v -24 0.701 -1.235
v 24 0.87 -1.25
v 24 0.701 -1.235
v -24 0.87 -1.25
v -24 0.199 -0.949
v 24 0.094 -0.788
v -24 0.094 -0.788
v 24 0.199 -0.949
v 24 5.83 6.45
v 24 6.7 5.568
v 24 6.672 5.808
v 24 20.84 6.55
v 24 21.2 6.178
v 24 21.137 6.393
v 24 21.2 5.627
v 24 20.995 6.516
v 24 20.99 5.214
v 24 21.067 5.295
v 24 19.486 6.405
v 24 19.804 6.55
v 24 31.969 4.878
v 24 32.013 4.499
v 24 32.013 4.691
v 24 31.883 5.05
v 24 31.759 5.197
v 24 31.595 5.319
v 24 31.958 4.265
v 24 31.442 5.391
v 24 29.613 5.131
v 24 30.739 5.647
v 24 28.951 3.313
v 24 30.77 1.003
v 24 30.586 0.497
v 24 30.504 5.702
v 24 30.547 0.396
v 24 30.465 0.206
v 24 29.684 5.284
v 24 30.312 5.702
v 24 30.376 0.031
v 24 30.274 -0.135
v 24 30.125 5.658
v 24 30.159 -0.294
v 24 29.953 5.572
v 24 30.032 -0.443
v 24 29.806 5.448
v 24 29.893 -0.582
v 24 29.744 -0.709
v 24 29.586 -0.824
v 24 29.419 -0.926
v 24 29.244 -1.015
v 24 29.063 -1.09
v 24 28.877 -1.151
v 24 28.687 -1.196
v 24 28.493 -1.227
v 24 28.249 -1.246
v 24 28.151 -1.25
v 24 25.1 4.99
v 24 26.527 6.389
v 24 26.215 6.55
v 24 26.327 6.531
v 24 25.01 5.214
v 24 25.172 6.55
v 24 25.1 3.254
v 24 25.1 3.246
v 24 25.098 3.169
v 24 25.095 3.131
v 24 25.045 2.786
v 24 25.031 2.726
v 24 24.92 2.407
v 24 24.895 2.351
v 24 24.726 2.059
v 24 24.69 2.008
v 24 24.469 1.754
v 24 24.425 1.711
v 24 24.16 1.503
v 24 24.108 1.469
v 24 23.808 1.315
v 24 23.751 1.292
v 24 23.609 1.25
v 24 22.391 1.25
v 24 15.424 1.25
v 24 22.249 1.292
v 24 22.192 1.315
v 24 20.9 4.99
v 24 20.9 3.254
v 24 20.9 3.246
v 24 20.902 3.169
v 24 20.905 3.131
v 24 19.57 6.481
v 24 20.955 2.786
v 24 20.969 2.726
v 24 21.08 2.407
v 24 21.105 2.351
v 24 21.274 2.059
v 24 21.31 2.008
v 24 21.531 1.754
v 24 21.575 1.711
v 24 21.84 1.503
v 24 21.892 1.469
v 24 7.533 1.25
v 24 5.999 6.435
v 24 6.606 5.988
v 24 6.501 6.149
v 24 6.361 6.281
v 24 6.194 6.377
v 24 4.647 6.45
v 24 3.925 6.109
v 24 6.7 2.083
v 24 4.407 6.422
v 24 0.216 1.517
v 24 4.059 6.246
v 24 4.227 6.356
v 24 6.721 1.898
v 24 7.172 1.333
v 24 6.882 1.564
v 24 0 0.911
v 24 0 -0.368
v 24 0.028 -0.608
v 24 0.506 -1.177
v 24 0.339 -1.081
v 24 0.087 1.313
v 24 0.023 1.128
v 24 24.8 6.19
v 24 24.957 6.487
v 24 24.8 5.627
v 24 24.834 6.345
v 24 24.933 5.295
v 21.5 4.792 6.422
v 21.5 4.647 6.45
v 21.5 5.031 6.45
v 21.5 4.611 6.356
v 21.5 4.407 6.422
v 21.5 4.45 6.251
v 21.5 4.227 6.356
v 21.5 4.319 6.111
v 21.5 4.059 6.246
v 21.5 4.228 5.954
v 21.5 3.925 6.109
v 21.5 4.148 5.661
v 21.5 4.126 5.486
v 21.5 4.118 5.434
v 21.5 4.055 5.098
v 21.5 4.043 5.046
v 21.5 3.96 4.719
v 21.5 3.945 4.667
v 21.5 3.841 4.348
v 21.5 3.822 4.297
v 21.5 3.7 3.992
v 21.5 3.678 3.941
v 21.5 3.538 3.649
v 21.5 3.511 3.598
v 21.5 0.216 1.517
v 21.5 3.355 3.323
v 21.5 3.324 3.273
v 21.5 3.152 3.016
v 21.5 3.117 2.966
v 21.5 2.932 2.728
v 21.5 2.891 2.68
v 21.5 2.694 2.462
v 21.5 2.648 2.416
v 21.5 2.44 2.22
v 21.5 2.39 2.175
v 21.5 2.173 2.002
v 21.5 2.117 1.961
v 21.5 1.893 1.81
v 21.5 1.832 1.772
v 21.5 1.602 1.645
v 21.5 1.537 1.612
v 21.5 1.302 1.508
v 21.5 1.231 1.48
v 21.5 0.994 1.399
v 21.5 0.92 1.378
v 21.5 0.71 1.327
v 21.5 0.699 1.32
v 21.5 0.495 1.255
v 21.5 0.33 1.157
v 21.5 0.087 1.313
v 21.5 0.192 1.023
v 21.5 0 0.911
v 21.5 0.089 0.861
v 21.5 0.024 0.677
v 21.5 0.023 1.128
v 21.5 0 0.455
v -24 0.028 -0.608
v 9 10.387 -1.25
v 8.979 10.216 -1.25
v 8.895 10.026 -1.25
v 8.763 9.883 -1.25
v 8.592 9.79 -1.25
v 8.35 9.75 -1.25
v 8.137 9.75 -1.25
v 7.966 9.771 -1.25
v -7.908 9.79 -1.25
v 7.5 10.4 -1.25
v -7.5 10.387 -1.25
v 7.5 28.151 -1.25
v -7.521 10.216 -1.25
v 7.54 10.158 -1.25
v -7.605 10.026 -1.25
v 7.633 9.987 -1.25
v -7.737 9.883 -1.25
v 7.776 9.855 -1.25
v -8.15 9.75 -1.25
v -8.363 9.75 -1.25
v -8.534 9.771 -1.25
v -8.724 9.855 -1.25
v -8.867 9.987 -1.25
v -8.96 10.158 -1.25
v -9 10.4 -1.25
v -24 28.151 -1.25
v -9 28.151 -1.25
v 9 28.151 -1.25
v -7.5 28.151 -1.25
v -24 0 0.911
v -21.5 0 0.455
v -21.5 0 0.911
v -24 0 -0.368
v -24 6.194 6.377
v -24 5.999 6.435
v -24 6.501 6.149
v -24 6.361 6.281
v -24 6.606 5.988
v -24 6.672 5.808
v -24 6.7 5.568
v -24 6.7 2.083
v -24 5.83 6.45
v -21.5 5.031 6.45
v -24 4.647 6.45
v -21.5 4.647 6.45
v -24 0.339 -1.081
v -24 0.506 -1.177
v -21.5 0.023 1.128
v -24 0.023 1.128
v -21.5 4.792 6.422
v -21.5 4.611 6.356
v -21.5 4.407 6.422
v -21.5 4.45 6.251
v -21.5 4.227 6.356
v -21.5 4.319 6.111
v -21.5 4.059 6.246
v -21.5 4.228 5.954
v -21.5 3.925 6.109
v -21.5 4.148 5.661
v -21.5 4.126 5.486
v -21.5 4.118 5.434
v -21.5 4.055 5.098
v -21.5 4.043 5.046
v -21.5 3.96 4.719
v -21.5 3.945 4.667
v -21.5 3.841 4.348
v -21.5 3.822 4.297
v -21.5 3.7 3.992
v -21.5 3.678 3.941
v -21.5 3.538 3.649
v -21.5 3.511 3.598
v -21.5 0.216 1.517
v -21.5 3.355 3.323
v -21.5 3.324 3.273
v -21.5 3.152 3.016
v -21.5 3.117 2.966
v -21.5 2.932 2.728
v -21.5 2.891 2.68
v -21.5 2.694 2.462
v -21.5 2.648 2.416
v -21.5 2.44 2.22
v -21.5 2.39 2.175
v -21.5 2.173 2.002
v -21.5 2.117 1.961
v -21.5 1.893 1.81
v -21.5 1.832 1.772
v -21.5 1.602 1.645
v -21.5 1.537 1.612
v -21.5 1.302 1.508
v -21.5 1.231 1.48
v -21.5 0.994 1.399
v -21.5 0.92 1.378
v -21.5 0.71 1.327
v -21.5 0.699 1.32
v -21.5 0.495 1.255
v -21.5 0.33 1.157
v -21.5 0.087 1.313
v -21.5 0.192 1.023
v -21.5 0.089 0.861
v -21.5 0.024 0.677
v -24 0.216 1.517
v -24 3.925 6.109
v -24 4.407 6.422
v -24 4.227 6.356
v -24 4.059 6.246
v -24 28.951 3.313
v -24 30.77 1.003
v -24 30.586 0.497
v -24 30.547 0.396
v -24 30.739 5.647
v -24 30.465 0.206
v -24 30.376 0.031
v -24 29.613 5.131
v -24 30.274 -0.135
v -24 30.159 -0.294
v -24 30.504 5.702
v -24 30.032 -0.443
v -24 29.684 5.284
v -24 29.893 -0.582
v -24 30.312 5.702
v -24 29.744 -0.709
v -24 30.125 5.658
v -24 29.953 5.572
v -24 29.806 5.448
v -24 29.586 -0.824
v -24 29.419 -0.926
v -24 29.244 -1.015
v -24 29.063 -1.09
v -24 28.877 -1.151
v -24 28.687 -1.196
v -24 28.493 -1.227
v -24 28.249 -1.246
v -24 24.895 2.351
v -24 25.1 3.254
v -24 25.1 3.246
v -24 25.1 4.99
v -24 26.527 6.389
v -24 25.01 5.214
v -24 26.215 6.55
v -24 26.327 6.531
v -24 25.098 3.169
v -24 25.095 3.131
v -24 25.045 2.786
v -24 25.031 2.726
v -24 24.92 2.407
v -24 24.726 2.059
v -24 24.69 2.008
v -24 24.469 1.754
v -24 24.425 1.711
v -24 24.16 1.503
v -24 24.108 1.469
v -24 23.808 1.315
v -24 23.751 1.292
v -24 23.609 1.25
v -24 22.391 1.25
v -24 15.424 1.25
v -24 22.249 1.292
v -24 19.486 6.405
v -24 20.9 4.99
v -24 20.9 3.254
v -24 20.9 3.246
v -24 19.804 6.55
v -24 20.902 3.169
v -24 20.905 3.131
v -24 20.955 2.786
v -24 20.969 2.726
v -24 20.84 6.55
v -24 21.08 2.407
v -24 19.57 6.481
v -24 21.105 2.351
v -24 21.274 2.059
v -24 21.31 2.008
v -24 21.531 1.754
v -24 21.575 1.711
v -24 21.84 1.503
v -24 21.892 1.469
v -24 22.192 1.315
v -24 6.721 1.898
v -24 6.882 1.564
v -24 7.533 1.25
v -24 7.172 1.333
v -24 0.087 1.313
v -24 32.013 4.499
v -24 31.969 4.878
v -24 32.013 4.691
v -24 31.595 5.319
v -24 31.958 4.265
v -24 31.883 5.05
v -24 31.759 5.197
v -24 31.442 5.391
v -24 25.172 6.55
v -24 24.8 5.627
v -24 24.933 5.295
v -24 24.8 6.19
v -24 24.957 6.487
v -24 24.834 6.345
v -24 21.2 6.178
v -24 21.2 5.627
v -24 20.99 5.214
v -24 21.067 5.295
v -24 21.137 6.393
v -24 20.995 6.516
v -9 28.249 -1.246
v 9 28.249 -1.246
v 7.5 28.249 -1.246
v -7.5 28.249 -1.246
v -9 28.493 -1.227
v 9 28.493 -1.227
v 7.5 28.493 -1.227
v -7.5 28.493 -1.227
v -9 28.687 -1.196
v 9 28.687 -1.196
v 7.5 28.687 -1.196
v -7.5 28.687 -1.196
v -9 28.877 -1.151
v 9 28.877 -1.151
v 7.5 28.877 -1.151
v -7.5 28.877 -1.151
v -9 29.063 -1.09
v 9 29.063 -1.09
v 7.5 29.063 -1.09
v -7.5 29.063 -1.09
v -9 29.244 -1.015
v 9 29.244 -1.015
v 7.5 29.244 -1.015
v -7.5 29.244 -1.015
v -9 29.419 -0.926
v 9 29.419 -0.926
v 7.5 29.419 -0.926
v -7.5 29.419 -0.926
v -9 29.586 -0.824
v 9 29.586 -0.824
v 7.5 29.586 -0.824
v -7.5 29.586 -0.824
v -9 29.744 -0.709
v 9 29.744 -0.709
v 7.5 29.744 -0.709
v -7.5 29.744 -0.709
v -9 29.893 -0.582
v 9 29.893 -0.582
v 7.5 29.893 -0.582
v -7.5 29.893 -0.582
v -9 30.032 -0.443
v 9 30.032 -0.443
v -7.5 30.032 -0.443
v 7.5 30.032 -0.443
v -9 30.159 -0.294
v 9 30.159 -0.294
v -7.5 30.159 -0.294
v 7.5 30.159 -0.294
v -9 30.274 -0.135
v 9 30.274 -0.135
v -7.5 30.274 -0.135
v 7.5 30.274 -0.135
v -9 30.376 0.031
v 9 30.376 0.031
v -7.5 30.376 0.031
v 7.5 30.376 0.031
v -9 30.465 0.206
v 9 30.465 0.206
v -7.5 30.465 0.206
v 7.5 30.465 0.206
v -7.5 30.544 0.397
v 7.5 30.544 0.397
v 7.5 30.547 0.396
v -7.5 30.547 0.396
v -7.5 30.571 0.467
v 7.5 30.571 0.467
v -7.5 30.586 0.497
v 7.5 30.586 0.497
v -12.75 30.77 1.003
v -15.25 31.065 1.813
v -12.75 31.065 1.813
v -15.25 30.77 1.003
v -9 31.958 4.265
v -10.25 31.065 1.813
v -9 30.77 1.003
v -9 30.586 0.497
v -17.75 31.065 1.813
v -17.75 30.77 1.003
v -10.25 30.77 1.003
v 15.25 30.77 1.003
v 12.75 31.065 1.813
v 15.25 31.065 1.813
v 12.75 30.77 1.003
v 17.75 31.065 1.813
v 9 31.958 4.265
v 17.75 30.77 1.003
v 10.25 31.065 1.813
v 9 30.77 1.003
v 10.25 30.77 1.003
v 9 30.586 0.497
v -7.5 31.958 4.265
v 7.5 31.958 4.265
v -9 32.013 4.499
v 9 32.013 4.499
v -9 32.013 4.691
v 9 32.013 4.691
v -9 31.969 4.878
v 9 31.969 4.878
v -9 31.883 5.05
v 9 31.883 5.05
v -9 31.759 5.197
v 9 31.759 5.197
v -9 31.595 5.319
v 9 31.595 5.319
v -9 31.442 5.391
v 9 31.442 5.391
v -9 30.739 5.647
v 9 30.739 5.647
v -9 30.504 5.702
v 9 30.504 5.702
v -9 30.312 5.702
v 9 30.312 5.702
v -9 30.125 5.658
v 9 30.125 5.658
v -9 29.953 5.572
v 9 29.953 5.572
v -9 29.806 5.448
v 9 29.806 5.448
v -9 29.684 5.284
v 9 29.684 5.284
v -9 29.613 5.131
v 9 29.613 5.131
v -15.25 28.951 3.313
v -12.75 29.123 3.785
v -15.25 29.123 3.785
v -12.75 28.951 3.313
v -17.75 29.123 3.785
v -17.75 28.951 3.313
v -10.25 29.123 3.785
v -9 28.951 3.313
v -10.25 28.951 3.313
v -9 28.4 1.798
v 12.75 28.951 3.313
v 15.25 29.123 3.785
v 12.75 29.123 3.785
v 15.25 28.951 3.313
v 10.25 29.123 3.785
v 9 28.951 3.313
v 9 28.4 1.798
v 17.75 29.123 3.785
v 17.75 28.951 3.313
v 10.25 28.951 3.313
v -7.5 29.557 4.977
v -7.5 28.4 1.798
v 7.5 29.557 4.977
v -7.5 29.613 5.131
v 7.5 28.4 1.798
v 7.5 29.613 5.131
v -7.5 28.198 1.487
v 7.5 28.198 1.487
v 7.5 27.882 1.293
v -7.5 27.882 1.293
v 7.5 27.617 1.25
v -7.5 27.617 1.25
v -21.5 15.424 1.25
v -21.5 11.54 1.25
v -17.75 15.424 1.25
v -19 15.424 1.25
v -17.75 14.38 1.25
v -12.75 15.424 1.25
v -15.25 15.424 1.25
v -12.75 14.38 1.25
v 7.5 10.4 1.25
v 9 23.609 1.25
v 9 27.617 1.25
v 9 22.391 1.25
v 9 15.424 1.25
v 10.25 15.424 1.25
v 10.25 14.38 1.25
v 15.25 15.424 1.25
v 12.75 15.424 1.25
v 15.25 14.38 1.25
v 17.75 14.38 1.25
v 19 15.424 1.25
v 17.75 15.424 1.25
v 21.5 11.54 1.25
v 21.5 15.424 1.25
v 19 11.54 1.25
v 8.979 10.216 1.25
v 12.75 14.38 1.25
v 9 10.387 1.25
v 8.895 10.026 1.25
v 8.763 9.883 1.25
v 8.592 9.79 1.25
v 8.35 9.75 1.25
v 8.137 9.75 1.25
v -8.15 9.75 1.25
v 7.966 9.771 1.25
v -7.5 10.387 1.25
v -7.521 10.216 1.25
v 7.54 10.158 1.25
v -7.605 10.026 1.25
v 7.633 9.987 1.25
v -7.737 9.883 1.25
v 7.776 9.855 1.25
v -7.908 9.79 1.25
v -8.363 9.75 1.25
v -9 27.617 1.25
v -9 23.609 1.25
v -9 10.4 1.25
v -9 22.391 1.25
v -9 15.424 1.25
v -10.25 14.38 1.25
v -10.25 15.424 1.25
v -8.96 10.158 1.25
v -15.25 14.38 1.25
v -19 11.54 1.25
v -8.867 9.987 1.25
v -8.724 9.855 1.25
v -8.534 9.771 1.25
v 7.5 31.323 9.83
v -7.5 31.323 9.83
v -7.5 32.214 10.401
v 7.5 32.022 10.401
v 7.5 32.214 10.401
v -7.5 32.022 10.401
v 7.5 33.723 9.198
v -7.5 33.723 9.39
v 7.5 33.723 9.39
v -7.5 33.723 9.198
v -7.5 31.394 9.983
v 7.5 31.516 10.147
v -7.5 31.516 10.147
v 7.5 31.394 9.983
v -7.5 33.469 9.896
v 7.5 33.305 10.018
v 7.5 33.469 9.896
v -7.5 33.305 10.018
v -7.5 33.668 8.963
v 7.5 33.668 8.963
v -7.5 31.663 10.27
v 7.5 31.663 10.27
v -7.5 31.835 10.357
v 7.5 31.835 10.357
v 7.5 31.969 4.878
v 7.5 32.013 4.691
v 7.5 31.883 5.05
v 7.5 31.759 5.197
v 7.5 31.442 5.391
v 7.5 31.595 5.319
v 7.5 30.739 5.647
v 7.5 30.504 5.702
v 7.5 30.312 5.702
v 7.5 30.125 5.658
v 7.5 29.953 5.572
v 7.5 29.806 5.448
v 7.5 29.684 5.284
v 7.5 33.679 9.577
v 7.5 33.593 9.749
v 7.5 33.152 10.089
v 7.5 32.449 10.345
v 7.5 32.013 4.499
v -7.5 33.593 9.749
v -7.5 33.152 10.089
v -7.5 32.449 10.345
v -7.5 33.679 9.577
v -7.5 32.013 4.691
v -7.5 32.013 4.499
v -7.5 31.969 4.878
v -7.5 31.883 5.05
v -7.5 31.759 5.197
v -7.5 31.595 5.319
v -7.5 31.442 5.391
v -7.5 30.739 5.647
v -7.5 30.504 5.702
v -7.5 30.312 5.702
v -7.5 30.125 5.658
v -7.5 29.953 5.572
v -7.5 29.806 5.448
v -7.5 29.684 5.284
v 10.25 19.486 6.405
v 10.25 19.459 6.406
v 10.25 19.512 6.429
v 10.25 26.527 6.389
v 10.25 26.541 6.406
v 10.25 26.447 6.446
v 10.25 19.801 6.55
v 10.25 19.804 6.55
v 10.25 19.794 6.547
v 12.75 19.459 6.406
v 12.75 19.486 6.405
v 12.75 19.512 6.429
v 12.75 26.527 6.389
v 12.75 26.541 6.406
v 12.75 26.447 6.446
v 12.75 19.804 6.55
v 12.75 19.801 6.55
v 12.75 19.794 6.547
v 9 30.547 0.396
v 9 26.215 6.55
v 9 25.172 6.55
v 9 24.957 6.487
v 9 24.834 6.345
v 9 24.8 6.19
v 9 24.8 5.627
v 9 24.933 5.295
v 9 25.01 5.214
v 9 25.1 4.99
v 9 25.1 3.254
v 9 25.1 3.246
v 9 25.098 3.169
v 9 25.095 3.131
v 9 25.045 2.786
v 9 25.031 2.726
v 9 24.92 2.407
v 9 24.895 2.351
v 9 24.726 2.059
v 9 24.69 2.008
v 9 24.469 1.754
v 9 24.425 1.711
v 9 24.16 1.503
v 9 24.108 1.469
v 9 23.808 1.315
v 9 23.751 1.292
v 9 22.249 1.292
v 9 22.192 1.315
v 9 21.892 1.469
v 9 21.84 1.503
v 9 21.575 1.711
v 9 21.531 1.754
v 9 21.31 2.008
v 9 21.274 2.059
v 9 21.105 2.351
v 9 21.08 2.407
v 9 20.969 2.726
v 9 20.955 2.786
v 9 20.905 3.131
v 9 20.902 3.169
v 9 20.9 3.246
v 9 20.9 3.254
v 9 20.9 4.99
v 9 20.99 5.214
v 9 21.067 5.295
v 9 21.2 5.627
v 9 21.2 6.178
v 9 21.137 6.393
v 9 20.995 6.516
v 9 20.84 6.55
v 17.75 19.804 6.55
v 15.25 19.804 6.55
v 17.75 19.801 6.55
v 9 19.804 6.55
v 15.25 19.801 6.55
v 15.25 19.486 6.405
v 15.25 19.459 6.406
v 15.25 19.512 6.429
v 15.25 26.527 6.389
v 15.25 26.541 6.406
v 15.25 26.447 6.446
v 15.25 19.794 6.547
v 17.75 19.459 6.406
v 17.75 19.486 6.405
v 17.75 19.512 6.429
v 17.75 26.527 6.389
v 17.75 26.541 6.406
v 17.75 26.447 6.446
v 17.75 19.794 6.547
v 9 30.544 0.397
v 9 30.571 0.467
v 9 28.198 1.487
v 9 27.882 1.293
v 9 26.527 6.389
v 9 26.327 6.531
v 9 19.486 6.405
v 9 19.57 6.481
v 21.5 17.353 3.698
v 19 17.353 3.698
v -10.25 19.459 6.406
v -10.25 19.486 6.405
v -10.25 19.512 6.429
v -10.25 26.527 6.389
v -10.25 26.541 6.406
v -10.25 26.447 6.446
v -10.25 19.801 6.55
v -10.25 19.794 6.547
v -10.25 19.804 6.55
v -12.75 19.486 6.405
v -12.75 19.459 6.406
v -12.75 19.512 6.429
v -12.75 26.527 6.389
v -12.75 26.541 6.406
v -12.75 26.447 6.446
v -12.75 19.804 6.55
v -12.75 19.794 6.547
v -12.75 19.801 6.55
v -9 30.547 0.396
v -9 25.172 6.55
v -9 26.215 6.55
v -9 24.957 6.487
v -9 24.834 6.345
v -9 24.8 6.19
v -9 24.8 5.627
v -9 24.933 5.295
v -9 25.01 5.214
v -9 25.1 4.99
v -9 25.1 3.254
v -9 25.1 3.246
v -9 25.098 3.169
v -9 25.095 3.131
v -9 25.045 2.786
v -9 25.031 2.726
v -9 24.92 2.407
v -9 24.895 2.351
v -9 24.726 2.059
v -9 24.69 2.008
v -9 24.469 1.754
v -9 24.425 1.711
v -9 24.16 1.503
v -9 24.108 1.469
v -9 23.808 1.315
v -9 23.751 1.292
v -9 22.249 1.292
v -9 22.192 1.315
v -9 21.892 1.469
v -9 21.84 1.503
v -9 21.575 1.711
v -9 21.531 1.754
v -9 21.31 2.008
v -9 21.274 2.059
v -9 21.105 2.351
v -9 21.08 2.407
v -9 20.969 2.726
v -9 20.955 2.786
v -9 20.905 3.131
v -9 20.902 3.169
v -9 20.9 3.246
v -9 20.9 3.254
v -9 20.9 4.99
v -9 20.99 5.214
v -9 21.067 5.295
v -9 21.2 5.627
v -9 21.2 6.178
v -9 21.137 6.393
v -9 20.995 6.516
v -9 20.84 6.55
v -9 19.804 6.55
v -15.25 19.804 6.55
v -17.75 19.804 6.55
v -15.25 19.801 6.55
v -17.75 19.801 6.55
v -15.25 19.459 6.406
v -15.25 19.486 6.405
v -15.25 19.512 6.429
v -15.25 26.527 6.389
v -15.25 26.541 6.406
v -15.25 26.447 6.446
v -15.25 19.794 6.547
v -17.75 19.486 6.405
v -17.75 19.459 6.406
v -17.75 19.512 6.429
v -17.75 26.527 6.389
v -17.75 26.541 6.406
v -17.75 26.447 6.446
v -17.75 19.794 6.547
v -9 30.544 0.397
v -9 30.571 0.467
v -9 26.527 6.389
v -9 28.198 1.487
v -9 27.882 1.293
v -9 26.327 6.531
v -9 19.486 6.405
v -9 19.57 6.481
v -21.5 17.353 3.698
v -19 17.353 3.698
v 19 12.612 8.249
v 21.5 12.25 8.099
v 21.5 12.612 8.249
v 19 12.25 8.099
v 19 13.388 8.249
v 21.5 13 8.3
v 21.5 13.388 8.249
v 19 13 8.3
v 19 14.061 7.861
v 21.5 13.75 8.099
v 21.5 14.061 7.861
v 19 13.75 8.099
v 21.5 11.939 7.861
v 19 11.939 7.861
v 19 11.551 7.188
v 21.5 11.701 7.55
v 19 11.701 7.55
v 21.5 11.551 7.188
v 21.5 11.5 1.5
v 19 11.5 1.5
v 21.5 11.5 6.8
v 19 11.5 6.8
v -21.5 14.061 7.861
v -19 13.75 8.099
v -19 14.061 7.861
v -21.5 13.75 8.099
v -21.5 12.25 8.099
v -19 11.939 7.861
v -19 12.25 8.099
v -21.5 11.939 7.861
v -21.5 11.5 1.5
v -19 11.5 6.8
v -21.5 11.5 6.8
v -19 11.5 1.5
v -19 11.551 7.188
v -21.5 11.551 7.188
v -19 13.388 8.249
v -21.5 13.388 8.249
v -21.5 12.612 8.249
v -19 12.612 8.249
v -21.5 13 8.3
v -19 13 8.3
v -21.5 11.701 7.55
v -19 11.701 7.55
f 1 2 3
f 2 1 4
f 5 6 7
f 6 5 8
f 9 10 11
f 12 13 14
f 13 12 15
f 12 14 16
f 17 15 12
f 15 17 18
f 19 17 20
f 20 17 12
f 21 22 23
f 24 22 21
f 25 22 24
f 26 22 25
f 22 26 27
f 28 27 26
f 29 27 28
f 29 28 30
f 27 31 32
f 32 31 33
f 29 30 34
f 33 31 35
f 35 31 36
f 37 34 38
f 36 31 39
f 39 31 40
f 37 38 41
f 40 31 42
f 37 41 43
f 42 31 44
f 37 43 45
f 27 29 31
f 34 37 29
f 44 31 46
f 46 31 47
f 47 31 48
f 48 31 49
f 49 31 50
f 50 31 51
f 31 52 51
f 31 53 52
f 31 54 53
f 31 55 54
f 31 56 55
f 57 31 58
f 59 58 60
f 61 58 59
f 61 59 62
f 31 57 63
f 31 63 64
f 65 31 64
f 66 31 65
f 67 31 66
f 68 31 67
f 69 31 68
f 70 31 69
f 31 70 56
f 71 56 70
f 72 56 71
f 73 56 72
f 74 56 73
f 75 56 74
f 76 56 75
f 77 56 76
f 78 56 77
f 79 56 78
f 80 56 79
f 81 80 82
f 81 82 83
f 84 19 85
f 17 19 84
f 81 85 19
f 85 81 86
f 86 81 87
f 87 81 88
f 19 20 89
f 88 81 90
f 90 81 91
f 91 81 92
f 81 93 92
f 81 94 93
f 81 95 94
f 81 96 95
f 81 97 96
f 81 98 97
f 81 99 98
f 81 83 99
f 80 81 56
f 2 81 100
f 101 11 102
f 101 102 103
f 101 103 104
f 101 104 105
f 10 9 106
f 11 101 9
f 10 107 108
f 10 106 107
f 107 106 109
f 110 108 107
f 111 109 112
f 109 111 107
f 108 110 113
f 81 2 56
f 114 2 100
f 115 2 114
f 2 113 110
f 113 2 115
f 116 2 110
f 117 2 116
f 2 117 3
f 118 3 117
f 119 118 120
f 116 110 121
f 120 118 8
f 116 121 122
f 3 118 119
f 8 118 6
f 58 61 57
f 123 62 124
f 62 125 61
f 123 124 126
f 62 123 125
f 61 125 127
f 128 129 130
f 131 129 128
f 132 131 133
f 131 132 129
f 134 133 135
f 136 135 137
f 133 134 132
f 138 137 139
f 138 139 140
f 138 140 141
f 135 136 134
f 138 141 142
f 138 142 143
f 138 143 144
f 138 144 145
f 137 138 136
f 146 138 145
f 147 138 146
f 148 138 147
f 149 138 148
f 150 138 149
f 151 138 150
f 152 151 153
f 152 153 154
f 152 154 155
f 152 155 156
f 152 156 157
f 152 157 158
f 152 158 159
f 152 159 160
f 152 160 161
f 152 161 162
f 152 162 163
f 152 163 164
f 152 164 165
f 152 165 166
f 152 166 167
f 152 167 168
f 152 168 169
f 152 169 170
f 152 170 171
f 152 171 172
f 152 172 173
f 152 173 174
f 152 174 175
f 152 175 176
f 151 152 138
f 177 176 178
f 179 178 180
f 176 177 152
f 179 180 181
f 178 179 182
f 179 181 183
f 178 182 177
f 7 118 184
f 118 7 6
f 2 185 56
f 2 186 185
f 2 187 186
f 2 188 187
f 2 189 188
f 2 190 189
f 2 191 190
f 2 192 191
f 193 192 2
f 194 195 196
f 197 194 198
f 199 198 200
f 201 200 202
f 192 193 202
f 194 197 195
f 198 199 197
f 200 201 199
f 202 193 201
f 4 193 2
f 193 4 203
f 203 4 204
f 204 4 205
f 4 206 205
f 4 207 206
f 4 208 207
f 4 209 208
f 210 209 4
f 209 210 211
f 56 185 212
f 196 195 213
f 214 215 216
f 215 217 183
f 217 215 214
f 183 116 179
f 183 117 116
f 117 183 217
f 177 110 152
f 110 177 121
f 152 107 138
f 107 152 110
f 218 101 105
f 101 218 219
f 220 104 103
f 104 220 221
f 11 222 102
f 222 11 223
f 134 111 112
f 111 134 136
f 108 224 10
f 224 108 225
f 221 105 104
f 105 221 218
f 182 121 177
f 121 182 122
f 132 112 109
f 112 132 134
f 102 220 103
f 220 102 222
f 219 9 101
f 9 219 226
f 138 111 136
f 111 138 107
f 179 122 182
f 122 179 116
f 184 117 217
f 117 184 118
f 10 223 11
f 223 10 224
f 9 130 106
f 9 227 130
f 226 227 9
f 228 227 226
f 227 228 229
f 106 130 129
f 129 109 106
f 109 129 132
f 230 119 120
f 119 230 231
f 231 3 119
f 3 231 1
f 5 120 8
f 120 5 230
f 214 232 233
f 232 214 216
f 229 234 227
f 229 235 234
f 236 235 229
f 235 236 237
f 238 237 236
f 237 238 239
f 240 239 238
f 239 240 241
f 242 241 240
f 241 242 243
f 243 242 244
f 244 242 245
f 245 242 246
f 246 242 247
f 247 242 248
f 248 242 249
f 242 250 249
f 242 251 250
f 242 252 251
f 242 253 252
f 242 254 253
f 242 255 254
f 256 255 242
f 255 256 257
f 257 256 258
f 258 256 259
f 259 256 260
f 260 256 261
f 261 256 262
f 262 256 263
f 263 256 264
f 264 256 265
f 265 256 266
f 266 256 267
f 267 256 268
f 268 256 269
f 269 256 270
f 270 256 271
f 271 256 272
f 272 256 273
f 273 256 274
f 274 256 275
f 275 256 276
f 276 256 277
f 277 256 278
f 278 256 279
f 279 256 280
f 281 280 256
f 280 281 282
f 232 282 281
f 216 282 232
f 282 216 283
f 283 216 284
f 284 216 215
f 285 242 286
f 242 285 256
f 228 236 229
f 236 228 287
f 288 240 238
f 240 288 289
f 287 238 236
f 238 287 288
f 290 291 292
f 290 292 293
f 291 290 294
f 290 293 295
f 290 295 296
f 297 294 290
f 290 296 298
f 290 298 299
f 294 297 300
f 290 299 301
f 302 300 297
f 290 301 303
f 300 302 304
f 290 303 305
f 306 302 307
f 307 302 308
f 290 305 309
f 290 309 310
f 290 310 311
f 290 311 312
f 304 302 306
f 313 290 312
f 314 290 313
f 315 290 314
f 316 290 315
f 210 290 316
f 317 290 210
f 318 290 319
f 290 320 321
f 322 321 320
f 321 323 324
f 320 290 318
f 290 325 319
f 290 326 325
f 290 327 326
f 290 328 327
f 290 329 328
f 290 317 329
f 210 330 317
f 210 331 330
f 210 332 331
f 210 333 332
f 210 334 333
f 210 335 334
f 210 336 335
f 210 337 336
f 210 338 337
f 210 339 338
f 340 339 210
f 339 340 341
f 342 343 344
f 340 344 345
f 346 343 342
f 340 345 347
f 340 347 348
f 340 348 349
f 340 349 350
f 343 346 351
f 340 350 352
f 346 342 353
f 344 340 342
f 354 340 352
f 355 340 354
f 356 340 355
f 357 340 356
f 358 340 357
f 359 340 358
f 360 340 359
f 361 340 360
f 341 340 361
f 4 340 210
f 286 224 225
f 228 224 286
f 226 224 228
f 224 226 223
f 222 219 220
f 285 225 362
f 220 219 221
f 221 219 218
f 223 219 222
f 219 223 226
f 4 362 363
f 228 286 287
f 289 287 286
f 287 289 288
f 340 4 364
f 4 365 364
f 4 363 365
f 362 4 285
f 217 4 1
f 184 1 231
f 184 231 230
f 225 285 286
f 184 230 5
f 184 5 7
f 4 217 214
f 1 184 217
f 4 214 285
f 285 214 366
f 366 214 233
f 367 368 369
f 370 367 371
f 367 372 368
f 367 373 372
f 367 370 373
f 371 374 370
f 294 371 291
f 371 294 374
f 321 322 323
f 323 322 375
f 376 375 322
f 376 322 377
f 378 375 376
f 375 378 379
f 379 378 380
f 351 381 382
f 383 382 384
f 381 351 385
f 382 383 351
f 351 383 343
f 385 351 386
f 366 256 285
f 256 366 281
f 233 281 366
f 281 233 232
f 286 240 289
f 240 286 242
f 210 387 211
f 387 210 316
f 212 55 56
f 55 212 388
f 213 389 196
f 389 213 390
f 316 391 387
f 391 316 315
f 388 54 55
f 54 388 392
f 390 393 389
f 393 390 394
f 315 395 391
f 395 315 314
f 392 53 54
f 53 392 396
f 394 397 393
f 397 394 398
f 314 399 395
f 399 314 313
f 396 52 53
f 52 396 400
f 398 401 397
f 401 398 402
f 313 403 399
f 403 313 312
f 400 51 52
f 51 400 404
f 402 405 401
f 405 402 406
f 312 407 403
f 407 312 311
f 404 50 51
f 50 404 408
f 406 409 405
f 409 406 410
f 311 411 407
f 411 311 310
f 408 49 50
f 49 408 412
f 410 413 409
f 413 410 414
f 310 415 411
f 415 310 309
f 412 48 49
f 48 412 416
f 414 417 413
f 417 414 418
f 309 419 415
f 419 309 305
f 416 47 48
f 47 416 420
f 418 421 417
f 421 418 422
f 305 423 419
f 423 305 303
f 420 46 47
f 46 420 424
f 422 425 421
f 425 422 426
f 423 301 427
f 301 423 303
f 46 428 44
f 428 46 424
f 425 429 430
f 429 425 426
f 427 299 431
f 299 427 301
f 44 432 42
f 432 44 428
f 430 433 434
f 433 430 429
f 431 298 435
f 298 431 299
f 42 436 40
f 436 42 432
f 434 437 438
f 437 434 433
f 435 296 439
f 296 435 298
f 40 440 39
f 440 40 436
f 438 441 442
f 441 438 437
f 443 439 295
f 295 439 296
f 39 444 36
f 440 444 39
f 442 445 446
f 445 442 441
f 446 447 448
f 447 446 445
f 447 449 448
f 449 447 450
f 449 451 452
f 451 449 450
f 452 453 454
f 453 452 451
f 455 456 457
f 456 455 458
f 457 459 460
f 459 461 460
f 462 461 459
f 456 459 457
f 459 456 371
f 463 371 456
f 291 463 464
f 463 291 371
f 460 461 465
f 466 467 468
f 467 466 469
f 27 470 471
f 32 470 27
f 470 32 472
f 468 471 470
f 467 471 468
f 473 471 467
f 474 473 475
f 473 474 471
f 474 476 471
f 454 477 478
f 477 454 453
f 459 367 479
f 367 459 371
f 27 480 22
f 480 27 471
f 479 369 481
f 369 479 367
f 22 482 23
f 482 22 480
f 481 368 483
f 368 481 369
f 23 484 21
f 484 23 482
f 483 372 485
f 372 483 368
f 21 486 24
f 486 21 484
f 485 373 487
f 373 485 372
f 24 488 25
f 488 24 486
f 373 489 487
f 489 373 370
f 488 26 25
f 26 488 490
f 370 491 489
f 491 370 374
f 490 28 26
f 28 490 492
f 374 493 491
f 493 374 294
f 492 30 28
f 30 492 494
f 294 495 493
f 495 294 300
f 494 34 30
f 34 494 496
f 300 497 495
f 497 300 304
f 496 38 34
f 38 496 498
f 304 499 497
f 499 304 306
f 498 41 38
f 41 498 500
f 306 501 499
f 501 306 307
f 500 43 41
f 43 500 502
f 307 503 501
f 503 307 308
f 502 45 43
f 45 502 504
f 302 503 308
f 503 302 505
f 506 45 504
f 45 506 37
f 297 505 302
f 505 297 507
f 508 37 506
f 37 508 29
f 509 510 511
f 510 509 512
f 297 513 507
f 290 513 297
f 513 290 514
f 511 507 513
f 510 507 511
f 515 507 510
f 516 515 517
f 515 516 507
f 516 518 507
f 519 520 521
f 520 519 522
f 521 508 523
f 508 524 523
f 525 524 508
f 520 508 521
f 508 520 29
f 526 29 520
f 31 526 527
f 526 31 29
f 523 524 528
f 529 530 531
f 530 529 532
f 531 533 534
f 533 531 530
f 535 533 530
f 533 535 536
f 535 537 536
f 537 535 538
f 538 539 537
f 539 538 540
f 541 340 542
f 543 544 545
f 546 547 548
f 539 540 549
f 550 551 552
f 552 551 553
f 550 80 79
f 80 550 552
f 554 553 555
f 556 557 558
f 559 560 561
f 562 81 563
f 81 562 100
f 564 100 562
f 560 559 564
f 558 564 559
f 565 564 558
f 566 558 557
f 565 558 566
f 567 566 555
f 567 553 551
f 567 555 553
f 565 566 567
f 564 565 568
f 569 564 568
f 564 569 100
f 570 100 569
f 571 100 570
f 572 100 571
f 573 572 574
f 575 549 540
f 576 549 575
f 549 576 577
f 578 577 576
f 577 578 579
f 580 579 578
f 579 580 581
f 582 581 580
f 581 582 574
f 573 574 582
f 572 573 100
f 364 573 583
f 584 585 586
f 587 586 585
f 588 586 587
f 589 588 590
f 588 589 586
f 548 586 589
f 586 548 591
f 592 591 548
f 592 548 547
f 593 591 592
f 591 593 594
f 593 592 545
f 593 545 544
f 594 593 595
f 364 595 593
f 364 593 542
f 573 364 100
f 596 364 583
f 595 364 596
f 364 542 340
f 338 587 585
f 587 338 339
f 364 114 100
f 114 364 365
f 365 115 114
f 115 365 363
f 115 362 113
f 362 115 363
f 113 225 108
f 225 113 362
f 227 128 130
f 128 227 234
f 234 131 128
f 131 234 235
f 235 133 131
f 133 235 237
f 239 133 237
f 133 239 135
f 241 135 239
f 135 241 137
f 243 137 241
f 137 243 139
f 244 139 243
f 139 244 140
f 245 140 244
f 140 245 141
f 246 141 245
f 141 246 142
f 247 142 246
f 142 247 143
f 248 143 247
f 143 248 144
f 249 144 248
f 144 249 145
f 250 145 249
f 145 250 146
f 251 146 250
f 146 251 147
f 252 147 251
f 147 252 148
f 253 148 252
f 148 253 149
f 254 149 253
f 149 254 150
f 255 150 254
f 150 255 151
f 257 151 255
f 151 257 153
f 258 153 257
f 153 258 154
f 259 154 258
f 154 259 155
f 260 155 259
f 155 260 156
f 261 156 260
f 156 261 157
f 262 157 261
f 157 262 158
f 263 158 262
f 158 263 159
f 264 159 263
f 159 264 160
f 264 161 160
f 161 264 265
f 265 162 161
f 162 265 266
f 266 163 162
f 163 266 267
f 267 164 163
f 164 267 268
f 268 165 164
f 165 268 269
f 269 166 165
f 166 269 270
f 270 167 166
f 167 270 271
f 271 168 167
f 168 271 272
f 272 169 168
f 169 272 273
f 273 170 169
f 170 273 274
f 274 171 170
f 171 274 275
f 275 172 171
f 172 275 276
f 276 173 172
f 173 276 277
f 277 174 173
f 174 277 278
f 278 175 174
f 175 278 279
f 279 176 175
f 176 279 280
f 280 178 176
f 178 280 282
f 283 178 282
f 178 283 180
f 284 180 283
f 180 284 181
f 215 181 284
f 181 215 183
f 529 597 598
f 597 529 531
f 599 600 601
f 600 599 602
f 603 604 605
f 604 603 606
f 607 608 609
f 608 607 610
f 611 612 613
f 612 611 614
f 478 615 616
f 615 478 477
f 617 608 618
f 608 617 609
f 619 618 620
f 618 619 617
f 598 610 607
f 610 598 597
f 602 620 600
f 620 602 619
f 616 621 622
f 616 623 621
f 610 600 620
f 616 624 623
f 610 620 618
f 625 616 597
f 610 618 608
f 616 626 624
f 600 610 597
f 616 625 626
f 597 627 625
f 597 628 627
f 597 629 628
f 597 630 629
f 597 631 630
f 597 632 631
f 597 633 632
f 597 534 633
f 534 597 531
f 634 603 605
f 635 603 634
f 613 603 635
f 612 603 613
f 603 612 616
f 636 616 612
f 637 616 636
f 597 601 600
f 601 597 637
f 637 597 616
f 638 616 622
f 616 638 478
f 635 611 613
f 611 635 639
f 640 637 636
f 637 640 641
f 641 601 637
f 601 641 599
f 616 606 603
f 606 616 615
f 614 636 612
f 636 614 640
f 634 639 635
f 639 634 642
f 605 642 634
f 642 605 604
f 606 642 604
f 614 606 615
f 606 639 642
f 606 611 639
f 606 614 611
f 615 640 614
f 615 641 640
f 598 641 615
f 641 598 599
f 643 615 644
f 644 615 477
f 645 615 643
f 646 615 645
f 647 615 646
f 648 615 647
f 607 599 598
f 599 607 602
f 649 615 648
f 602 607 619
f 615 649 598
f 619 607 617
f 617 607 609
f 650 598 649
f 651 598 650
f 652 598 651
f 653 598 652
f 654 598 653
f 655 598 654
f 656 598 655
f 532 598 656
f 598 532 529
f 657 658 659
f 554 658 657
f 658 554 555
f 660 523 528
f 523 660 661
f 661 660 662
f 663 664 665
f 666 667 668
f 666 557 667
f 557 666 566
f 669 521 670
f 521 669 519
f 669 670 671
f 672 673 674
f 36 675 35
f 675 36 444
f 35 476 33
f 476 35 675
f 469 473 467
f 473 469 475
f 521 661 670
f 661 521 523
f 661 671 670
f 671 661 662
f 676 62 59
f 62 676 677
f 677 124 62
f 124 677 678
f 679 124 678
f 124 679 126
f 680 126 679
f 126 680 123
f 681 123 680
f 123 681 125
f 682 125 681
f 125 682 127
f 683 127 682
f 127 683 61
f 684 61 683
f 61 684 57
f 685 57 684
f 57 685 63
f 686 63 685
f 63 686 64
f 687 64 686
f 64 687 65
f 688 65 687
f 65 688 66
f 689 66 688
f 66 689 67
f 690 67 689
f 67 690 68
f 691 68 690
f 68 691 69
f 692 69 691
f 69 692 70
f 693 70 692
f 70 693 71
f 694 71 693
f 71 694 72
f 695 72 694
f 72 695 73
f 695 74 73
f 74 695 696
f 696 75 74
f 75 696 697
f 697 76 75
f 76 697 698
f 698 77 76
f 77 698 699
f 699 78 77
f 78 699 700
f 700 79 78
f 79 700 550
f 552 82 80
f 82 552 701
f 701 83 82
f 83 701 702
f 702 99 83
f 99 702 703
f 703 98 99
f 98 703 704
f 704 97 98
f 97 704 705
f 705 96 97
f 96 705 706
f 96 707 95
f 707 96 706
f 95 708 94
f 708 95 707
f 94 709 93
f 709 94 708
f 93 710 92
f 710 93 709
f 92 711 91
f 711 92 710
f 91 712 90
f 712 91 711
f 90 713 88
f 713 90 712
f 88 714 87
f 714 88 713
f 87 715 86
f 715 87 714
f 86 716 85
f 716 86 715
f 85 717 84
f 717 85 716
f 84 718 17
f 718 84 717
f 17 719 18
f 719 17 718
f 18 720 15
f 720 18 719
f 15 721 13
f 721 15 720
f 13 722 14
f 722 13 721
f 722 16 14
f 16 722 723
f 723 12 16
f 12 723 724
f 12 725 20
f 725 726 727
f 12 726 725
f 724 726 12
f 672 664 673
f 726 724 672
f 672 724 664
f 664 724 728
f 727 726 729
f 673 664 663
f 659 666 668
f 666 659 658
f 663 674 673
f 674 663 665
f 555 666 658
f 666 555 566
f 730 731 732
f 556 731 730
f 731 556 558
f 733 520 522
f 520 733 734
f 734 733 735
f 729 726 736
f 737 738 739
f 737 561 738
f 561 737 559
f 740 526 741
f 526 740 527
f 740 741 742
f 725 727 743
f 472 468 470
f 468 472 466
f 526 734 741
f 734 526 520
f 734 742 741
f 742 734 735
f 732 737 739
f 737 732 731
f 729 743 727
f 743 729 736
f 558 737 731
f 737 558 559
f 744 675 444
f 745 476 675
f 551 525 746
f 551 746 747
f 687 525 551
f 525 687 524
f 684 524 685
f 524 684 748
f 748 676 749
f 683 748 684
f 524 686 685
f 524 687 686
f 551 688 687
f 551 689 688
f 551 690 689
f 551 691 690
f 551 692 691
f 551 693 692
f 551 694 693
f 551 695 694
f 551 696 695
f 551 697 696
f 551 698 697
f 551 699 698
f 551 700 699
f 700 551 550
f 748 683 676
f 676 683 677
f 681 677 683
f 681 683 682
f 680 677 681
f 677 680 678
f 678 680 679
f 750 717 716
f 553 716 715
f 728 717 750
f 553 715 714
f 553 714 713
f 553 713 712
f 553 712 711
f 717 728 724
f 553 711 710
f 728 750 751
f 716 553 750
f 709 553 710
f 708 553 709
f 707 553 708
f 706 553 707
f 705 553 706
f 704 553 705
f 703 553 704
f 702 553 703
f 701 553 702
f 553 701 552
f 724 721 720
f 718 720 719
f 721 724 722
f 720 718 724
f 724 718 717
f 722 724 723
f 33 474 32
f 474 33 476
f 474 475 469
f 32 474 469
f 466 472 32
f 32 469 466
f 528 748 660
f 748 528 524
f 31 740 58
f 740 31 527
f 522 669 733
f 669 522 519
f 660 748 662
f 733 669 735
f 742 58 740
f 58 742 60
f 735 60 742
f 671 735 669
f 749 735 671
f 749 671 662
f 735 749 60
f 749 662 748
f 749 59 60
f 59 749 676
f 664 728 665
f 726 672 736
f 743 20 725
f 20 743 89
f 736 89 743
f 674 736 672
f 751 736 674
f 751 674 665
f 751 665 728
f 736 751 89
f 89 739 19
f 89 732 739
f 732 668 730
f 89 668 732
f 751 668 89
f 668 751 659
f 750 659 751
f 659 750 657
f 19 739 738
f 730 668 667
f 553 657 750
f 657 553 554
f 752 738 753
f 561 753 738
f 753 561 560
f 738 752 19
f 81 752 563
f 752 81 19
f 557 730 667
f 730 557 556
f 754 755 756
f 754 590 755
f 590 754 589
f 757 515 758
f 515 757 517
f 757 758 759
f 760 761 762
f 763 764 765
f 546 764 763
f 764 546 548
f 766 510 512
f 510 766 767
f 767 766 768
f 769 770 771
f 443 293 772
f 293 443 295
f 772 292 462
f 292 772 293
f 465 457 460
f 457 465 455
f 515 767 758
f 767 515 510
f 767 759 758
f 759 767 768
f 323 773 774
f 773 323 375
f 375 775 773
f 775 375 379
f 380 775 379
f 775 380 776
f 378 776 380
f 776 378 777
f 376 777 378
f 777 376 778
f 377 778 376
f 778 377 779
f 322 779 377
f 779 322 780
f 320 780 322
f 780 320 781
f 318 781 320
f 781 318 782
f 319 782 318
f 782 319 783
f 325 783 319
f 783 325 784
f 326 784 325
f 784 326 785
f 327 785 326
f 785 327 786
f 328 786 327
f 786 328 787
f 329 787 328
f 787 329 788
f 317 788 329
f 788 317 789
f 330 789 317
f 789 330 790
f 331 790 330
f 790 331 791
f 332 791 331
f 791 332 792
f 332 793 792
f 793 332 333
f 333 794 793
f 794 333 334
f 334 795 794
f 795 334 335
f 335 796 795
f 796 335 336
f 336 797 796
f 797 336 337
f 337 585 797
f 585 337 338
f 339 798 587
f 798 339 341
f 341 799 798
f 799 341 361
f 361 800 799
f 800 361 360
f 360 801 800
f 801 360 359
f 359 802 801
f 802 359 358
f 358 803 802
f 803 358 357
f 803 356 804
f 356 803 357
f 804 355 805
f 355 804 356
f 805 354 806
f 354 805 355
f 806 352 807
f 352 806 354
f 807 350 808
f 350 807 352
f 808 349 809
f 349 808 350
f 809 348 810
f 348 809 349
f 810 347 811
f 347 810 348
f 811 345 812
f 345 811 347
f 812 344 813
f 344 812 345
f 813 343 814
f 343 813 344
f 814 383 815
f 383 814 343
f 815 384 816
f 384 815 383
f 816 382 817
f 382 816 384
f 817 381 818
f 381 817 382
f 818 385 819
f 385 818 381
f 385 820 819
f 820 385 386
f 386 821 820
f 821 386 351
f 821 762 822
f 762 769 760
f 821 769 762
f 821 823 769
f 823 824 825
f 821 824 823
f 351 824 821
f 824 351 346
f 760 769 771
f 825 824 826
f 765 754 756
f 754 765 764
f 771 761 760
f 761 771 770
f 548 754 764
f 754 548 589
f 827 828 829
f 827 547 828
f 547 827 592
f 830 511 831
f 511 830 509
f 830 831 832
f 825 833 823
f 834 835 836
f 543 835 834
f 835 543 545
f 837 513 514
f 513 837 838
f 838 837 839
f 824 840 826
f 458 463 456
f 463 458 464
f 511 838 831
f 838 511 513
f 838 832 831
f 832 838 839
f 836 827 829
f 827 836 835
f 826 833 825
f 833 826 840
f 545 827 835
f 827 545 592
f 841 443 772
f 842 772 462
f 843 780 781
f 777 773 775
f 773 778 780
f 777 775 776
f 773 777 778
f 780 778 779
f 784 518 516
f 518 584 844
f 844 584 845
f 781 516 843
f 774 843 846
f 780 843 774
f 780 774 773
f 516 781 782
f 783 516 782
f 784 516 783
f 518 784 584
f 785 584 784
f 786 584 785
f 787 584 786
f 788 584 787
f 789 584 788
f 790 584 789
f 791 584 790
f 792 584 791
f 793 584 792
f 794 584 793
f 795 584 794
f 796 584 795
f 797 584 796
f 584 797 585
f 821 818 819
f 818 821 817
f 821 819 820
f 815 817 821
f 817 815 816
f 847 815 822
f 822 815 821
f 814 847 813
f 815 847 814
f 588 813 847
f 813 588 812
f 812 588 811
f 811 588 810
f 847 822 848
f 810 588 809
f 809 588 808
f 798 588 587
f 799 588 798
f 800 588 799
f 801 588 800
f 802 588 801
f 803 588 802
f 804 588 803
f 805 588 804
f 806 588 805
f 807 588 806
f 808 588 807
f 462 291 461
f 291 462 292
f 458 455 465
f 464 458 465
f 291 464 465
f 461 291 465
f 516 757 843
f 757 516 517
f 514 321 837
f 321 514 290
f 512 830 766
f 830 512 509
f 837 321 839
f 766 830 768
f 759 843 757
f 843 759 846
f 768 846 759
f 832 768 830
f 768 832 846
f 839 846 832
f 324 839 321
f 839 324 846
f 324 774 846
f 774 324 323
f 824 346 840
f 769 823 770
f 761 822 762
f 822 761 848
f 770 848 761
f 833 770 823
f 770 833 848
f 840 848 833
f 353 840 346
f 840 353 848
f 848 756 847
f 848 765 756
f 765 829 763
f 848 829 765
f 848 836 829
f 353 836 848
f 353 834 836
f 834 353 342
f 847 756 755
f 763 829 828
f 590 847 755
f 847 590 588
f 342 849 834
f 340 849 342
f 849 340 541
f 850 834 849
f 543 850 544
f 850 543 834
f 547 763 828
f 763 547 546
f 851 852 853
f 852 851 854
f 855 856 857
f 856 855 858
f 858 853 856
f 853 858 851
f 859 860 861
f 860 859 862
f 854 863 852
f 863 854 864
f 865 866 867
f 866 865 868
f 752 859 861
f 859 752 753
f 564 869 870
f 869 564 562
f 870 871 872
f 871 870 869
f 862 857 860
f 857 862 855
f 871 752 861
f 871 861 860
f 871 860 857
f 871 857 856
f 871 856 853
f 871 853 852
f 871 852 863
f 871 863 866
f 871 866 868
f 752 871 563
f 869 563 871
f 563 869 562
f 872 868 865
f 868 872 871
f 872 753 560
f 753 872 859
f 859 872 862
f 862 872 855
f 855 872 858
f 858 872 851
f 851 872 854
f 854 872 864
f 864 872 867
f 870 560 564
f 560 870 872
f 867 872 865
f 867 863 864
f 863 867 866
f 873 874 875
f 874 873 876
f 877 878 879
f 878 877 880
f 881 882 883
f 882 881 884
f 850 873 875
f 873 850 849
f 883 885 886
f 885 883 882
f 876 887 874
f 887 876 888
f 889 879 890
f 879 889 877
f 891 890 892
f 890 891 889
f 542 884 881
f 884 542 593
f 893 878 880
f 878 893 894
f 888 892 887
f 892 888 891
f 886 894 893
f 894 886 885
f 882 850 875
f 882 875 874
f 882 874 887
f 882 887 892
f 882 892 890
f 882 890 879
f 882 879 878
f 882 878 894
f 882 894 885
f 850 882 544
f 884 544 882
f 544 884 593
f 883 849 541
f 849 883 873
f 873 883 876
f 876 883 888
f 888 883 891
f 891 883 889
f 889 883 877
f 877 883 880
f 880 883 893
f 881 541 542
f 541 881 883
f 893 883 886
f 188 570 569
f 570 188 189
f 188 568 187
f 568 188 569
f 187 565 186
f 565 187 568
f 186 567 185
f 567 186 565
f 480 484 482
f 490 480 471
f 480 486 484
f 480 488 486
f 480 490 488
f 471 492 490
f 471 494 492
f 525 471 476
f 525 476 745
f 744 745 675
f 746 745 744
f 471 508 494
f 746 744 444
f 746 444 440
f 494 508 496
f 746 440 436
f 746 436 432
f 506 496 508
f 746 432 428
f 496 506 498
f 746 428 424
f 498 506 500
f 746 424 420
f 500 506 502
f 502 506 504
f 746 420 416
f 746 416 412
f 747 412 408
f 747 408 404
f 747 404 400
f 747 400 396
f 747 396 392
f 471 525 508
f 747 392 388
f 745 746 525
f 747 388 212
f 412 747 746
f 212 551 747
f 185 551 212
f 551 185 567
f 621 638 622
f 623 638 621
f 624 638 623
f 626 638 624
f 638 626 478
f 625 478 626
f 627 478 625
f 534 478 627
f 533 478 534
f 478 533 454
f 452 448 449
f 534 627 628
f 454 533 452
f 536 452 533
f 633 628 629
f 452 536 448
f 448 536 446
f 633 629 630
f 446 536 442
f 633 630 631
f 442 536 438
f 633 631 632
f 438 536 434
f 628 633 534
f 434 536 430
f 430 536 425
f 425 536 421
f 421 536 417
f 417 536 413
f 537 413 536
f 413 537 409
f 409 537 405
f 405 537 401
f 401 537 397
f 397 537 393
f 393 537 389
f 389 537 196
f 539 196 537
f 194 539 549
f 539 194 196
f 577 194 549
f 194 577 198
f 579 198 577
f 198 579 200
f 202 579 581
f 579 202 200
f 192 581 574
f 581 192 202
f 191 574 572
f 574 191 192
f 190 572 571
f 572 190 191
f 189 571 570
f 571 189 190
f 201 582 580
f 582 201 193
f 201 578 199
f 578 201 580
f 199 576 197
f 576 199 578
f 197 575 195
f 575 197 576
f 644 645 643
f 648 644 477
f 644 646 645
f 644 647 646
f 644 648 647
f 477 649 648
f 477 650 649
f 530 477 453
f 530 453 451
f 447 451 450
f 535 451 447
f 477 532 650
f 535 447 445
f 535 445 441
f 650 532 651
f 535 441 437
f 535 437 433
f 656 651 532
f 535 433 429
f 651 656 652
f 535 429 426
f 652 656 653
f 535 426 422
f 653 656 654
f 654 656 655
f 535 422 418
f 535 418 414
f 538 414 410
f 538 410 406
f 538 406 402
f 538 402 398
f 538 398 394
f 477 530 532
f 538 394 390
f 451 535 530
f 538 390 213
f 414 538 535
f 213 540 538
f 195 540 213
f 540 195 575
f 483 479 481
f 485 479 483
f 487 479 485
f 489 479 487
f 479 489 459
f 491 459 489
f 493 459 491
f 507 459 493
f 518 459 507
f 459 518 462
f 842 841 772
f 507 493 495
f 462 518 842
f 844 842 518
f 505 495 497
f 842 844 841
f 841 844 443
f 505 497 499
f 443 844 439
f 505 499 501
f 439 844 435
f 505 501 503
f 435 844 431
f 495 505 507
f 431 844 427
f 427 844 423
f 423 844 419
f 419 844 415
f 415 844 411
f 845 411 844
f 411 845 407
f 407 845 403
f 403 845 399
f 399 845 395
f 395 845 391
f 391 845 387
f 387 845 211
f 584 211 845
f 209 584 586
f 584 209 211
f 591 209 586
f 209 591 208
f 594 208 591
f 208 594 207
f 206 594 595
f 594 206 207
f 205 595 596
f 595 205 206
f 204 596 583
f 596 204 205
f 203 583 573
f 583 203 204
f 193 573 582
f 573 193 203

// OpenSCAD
/*
 * Box latch for Bosch Custom Case / Pick and Click
 * By smkent (GitHub) / bulbasaur0 (Printables)
 *
 * Licensed under Creative Commons (4.0 International License) Attribution-ShareAlike
 */

/* [Options] */

module __end_customizer_options__() { }

// Constants //

$fa = $preview ? $fa / 2 : 2;
$fs = $preview ? $fs / 2 : 0.4;

latch_width = 48;
latch_length = 28.2;
latch_thickness = 2.5;

grip_height = 7.7;
grip_length = 6.7;

grip_separation = 1.5;
grip_separation_setback = 9.75;
grip_segment_width = (latch_width - 2 * grip_separation ) / 3;

hinge_width_slop = 0.4;
hinge_height = 4;
hinge_width = 4.6 - hinge_width_slop;
hinge_clip_width = 4.0 - hinge_width_slop;
hinge_setback = 23.0;
hinge_thickness = 1.3;

wing_height = 8.3;
wing_top_diameter = 3;
wing_setback = 13;

stop_height = 5;

wall_thickness = 1.6;

corner_radius = latch_thickness / 3;

// Modules //

module rounded(r=corner_radius) {
    offset(r=-r)
    offset(r=2 * r)
    offset(r=-r)
    children();
}

module latch_grip_shape(inset_curve=false) {
    translate([latch_thickness / 2, grip_length])
    mirror([1, 0])
    difference() {
        polygon([
            [0, 0],
            [grip_height, 0],
            [grip_height, -latch_thickness],
            [latch_thickness, -grip_length],
            [0, -grip_length]
        ]);
        if (inset_curve) {
            translate([grip_height, -grip_length])
            scale([1, (grip_length - latch_thickness) / (grip_height - latch_thickness)])
            circle(r=(grip_height-latch_thickness));
        }
    }
}

module latch_base_stop_shape() {
    rounded() {
        // Base
        translate([0, latch_length / 2])
        square([latch_thickness, latch_length], center=true);

        // Grip
        latch_grip_shape(inset_curve=true);

        // Stop
        translate([latch_thickness / 2 - latch_thickness, latch_length])
        rotate(70)
        square([latch_thickness, stop_height * 1]);

        translate([-latch_thickness / 2, latch_length])
        intersection() {
            circle(r=latch_thickness);
            translate([0, -latch_thickness])
            square(latch_thickness * 2);
        }
    }
}

module latch_stop_middle_shape() {
    translate([latch_thickness / 2 - latch_thickness, latch_length])
    rotate(70)
    square([latch_thickness, stop_height * 2]);
}

module latch_base() {
    rotate([0, 90, 0]) {
        // Main body
        linear_extrude(height=latch_width, center=true)
        latch_base_stop_shape();
        // Middle stop
        linear_extrude(height=grip_segment_width, center=true)
        rounded()
        latch_stop_middle_shape();
        // Grip side tips
        for (mz = [0:1:1])
        mirror([0, 0, mz])
        translate([0, 0, latch_width / 2 - latch_thickness])
        linear_extrude(height=latch_thickness)
        rounded()
        latch_grip_shape();
    }
}

module latch_grip_cuts() {
    difference() {
        children();
        linear_extrude(height=latch_length, center=true)
        rounded(grip_separation * 0.4)
        for (mx = [0:1:1])
        mirror([mx, 0])
        translate([grip_segment_width / 2, grip_separation_setback])
        square([grip_separation, latch_length]);
    }
}

module latch_grip() {
    translate([0, grip_length, 0])
    rotate([0, 270, 0])
    linear_extrude(height=latch_width, center=true)
    polygon([[0, 0], [grip_height, 0], [latch_thickness, -grip_length], [0, -grip_length]]);
}

module latch_hinge_shape_cut() {
    intersection() {
        children();
        hull() {
            latch_base_stop_shape();
            translate([-hinge_height * 4, 0])
            latch_base_stop_shape();
        }
    }
}

module latch_hinge_shape(base_width_multiple_add=false) {
    base_width_multiple = 5 + (base_width_multiple_add ? 1 : 0);
    latch_hinge_shape_cut()
    rounded(r=hinge_thickness / 4)
    translate([-(hinge_height + latch_thickness) / 2, hinge_setback])
    translate([-hinge_thickness / 2, 0])
    difference() {
        translate([hinge_thickness / 2, 0]) {
            polygon(points=[
                [-hinge_height / 2 - hinge_thickness, -hinge_width / 2 - hinge_thickness],
                [hinge_height / 2 + hinge_thickness, -hinge_width / 2 - hinge_thickness * base_width_multiple],
                [hinge_height / 2 + hinge_thickness, hinge_width / 2 + hinge_thickness * base_width_multiple],
                [-hinge_height / 2 - hinge_thickness, hinge_width / 2 + hinge_thickness],
            ]);
        }
        // Hinge body opening
        translate([hinge_thickness / 2, 0])
        union()
        hull() {
            translate([-hinge_height / 4, 0])
            square([hinge_height / 2, hinge_width], center=true);
            circle(d=hinge_width);
        }
        // Hinge top opening
        translate([-hinge_height + hinge_thickness / 2, 0])
        square([hinge_height * 2, hinge_clip_width], center=true);
    }
}

module latch_hinge() {
    rotate([0, 90, 0])
    for (mz = [0:1:1])
    mirror([0, 0, mz]) {
        translate([0, 0, grip_segment_width / 2 + grip_separation])
        linear_extrude(height=grip_segment_width)
        latch_hinge_shape();

        for (zoff = [0, latch_thickness * 2])
        translate([0, 0, grip_segment_width / 2 + latch_thickness / 2 + grip_separation + zoff])
        linear_extrude(height=latch_thickness)
        latch_hinge_shape(base_width_multiple_add=true);
    }
}

module latch_wings() {
    translate([0, wing_setback, 0])
    rotate([0, 90, 0])
    for (mz = [0:1:1])
    mirror([0, 0, mz])
    translate([0, 0, latch_width / 2 - latch_thickness * 2])
    linear_extrude(height=latch_thickness)
    translate([-wing_top_diameter / 2, 0])
    hull()
    union() {
        translate([-wing_height + wing_top_diameter, 0])
        circle(d=wing_top_diameter);
        translate([0, -(wing_top_diameter - latch_thickness) / 2])
        circle(d=latch_thickness);
        translate([0, wing_top_diameter * 1.5])
        circle(d=latch_thickness);
    }
}

module custom_case_latch() {
    color("orangered", 0.8) {
        render(convexity=2)
        latch_grip_cuts() {
            latch_base();
            latch_hinge();
            latch_wings();
        }
    }
}

module main() {
    custom_case_latch();
}

main();
